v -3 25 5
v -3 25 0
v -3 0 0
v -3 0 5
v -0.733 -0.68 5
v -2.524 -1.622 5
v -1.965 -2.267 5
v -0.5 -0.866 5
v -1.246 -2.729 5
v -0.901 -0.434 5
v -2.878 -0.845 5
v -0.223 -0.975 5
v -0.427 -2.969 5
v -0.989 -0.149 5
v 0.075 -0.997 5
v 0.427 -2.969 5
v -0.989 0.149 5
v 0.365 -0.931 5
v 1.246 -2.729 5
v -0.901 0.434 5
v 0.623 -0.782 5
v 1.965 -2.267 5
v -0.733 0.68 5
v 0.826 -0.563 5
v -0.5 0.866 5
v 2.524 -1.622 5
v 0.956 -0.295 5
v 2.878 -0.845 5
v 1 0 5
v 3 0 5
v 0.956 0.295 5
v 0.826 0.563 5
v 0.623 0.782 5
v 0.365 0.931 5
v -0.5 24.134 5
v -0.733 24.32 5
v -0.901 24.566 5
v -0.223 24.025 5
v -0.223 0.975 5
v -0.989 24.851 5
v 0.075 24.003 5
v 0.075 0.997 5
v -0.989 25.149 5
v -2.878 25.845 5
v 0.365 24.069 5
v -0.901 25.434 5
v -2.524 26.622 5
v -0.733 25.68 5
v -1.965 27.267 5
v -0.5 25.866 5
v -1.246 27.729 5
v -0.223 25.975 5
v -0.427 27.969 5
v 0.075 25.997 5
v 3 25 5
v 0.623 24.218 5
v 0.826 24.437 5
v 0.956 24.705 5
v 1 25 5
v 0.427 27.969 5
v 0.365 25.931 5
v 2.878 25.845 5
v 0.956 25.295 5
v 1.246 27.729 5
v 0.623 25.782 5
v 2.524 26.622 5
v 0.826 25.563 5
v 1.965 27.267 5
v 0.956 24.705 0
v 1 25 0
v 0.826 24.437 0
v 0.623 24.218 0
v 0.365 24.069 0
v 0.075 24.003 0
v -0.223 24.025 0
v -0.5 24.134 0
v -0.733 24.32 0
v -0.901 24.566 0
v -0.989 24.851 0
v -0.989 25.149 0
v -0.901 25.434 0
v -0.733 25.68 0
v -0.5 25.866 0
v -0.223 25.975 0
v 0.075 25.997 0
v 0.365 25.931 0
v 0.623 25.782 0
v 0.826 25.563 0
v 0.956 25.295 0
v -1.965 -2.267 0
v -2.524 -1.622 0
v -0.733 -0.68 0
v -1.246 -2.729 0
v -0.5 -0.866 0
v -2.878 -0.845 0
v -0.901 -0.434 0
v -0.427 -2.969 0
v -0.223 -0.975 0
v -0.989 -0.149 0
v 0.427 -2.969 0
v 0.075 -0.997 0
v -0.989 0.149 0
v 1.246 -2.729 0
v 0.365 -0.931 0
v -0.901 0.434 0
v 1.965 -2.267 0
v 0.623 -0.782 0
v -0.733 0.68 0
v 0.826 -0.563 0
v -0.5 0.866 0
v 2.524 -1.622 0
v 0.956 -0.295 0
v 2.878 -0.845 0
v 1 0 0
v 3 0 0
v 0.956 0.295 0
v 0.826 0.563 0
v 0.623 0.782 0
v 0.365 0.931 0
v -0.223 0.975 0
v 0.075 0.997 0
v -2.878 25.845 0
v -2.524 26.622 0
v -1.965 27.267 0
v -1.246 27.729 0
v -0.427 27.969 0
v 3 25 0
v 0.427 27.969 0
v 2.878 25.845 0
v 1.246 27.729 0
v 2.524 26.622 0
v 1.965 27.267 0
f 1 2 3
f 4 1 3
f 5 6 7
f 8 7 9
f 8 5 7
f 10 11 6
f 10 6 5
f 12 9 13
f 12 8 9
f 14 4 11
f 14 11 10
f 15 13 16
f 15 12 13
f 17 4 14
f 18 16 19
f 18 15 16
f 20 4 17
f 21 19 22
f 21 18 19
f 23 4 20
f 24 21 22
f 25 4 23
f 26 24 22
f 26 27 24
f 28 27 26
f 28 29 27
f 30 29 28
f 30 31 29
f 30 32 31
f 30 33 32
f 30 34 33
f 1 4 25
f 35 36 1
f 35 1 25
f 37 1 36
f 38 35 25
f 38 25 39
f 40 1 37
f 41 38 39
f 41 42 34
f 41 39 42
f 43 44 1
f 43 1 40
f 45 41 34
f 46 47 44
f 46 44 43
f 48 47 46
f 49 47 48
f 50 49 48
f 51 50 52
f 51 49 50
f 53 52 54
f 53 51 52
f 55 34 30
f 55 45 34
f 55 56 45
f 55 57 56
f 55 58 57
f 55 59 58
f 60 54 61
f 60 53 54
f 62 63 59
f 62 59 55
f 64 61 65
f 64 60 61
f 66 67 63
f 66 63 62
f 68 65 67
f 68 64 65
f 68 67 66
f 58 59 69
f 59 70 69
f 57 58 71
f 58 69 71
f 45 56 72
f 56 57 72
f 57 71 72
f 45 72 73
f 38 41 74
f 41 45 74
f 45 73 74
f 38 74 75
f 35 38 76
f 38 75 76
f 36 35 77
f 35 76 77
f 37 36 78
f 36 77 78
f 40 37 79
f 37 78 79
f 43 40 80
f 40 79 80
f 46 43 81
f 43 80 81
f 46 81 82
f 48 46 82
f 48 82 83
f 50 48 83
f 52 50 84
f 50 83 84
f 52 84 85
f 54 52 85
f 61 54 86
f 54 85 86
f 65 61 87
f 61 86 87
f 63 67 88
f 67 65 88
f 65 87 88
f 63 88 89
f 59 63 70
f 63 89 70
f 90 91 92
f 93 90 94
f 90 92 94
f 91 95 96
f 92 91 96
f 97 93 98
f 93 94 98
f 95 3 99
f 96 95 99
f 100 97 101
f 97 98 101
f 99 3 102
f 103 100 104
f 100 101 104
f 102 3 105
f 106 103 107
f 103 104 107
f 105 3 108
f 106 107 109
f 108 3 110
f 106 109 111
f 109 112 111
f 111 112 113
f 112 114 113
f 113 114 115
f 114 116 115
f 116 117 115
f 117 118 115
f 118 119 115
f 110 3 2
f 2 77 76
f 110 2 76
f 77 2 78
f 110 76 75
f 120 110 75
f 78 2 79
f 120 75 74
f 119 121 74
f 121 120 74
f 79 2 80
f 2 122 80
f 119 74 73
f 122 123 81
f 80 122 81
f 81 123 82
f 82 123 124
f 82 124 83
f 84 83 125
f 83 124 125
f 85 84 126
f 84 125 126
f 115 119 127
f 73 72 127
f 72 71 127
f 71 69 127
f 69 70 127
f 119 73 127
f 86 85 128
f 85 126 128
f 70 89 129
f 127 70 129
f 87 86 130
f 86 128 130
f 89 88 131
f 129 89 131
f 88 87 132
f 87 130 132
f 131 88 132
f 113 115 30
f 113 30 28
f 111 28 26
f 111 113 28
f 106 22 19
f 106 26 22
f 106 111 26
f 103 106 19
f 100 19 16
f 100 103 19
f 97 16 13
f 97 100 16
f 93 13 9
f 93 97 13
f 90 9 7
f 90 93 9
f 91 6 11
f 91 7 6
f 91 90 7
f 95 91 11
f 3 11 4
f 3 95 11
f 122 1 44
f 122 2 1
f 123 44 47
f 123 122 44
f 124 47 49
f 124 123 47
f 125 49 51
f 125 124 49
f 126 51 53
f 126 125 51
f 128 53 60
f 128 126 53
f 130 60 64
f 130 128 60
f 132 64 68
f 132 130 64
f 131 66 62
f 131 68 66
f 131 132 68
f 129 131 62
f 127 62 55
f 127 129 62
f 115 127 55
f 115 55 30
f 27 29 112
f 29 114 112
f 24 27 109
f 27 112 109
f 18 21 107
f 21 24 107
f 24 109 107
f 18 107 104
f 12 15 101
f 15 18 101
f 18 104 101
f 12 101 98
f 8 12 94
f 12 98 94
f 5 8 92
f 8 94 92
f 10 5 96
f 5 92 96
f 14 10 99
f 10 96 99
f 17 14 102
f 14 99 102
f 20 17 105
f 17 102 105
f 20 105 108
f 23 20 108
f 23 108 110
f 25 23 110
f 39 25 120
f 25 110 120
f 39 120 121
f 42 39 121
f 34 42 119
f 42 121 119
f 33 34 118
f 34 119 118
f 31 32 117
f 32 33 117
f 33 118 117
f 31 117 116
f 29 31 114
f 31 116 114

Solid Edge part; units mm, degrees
sketch "Sketch1" plane through (0, 0, 0) normal (0, 0, 1) x (1, 0, 0)
  circle A0 centre (0, 0) radius 1
  line L0 (-3, 25) -> (-3, 0)
  line L1 (3, 25) -> (3, 0)
  arc A1 (3, 25) -> (-3, 25) centre (0, 25) ccw
  arc A2 (-3, 0) -> (3, 0) centre (0, 0) ccw
  circle A3 centre (0, 25) radius 1
extrude "Protrusion1" add sketch "Sketch1" along normal blind 5
